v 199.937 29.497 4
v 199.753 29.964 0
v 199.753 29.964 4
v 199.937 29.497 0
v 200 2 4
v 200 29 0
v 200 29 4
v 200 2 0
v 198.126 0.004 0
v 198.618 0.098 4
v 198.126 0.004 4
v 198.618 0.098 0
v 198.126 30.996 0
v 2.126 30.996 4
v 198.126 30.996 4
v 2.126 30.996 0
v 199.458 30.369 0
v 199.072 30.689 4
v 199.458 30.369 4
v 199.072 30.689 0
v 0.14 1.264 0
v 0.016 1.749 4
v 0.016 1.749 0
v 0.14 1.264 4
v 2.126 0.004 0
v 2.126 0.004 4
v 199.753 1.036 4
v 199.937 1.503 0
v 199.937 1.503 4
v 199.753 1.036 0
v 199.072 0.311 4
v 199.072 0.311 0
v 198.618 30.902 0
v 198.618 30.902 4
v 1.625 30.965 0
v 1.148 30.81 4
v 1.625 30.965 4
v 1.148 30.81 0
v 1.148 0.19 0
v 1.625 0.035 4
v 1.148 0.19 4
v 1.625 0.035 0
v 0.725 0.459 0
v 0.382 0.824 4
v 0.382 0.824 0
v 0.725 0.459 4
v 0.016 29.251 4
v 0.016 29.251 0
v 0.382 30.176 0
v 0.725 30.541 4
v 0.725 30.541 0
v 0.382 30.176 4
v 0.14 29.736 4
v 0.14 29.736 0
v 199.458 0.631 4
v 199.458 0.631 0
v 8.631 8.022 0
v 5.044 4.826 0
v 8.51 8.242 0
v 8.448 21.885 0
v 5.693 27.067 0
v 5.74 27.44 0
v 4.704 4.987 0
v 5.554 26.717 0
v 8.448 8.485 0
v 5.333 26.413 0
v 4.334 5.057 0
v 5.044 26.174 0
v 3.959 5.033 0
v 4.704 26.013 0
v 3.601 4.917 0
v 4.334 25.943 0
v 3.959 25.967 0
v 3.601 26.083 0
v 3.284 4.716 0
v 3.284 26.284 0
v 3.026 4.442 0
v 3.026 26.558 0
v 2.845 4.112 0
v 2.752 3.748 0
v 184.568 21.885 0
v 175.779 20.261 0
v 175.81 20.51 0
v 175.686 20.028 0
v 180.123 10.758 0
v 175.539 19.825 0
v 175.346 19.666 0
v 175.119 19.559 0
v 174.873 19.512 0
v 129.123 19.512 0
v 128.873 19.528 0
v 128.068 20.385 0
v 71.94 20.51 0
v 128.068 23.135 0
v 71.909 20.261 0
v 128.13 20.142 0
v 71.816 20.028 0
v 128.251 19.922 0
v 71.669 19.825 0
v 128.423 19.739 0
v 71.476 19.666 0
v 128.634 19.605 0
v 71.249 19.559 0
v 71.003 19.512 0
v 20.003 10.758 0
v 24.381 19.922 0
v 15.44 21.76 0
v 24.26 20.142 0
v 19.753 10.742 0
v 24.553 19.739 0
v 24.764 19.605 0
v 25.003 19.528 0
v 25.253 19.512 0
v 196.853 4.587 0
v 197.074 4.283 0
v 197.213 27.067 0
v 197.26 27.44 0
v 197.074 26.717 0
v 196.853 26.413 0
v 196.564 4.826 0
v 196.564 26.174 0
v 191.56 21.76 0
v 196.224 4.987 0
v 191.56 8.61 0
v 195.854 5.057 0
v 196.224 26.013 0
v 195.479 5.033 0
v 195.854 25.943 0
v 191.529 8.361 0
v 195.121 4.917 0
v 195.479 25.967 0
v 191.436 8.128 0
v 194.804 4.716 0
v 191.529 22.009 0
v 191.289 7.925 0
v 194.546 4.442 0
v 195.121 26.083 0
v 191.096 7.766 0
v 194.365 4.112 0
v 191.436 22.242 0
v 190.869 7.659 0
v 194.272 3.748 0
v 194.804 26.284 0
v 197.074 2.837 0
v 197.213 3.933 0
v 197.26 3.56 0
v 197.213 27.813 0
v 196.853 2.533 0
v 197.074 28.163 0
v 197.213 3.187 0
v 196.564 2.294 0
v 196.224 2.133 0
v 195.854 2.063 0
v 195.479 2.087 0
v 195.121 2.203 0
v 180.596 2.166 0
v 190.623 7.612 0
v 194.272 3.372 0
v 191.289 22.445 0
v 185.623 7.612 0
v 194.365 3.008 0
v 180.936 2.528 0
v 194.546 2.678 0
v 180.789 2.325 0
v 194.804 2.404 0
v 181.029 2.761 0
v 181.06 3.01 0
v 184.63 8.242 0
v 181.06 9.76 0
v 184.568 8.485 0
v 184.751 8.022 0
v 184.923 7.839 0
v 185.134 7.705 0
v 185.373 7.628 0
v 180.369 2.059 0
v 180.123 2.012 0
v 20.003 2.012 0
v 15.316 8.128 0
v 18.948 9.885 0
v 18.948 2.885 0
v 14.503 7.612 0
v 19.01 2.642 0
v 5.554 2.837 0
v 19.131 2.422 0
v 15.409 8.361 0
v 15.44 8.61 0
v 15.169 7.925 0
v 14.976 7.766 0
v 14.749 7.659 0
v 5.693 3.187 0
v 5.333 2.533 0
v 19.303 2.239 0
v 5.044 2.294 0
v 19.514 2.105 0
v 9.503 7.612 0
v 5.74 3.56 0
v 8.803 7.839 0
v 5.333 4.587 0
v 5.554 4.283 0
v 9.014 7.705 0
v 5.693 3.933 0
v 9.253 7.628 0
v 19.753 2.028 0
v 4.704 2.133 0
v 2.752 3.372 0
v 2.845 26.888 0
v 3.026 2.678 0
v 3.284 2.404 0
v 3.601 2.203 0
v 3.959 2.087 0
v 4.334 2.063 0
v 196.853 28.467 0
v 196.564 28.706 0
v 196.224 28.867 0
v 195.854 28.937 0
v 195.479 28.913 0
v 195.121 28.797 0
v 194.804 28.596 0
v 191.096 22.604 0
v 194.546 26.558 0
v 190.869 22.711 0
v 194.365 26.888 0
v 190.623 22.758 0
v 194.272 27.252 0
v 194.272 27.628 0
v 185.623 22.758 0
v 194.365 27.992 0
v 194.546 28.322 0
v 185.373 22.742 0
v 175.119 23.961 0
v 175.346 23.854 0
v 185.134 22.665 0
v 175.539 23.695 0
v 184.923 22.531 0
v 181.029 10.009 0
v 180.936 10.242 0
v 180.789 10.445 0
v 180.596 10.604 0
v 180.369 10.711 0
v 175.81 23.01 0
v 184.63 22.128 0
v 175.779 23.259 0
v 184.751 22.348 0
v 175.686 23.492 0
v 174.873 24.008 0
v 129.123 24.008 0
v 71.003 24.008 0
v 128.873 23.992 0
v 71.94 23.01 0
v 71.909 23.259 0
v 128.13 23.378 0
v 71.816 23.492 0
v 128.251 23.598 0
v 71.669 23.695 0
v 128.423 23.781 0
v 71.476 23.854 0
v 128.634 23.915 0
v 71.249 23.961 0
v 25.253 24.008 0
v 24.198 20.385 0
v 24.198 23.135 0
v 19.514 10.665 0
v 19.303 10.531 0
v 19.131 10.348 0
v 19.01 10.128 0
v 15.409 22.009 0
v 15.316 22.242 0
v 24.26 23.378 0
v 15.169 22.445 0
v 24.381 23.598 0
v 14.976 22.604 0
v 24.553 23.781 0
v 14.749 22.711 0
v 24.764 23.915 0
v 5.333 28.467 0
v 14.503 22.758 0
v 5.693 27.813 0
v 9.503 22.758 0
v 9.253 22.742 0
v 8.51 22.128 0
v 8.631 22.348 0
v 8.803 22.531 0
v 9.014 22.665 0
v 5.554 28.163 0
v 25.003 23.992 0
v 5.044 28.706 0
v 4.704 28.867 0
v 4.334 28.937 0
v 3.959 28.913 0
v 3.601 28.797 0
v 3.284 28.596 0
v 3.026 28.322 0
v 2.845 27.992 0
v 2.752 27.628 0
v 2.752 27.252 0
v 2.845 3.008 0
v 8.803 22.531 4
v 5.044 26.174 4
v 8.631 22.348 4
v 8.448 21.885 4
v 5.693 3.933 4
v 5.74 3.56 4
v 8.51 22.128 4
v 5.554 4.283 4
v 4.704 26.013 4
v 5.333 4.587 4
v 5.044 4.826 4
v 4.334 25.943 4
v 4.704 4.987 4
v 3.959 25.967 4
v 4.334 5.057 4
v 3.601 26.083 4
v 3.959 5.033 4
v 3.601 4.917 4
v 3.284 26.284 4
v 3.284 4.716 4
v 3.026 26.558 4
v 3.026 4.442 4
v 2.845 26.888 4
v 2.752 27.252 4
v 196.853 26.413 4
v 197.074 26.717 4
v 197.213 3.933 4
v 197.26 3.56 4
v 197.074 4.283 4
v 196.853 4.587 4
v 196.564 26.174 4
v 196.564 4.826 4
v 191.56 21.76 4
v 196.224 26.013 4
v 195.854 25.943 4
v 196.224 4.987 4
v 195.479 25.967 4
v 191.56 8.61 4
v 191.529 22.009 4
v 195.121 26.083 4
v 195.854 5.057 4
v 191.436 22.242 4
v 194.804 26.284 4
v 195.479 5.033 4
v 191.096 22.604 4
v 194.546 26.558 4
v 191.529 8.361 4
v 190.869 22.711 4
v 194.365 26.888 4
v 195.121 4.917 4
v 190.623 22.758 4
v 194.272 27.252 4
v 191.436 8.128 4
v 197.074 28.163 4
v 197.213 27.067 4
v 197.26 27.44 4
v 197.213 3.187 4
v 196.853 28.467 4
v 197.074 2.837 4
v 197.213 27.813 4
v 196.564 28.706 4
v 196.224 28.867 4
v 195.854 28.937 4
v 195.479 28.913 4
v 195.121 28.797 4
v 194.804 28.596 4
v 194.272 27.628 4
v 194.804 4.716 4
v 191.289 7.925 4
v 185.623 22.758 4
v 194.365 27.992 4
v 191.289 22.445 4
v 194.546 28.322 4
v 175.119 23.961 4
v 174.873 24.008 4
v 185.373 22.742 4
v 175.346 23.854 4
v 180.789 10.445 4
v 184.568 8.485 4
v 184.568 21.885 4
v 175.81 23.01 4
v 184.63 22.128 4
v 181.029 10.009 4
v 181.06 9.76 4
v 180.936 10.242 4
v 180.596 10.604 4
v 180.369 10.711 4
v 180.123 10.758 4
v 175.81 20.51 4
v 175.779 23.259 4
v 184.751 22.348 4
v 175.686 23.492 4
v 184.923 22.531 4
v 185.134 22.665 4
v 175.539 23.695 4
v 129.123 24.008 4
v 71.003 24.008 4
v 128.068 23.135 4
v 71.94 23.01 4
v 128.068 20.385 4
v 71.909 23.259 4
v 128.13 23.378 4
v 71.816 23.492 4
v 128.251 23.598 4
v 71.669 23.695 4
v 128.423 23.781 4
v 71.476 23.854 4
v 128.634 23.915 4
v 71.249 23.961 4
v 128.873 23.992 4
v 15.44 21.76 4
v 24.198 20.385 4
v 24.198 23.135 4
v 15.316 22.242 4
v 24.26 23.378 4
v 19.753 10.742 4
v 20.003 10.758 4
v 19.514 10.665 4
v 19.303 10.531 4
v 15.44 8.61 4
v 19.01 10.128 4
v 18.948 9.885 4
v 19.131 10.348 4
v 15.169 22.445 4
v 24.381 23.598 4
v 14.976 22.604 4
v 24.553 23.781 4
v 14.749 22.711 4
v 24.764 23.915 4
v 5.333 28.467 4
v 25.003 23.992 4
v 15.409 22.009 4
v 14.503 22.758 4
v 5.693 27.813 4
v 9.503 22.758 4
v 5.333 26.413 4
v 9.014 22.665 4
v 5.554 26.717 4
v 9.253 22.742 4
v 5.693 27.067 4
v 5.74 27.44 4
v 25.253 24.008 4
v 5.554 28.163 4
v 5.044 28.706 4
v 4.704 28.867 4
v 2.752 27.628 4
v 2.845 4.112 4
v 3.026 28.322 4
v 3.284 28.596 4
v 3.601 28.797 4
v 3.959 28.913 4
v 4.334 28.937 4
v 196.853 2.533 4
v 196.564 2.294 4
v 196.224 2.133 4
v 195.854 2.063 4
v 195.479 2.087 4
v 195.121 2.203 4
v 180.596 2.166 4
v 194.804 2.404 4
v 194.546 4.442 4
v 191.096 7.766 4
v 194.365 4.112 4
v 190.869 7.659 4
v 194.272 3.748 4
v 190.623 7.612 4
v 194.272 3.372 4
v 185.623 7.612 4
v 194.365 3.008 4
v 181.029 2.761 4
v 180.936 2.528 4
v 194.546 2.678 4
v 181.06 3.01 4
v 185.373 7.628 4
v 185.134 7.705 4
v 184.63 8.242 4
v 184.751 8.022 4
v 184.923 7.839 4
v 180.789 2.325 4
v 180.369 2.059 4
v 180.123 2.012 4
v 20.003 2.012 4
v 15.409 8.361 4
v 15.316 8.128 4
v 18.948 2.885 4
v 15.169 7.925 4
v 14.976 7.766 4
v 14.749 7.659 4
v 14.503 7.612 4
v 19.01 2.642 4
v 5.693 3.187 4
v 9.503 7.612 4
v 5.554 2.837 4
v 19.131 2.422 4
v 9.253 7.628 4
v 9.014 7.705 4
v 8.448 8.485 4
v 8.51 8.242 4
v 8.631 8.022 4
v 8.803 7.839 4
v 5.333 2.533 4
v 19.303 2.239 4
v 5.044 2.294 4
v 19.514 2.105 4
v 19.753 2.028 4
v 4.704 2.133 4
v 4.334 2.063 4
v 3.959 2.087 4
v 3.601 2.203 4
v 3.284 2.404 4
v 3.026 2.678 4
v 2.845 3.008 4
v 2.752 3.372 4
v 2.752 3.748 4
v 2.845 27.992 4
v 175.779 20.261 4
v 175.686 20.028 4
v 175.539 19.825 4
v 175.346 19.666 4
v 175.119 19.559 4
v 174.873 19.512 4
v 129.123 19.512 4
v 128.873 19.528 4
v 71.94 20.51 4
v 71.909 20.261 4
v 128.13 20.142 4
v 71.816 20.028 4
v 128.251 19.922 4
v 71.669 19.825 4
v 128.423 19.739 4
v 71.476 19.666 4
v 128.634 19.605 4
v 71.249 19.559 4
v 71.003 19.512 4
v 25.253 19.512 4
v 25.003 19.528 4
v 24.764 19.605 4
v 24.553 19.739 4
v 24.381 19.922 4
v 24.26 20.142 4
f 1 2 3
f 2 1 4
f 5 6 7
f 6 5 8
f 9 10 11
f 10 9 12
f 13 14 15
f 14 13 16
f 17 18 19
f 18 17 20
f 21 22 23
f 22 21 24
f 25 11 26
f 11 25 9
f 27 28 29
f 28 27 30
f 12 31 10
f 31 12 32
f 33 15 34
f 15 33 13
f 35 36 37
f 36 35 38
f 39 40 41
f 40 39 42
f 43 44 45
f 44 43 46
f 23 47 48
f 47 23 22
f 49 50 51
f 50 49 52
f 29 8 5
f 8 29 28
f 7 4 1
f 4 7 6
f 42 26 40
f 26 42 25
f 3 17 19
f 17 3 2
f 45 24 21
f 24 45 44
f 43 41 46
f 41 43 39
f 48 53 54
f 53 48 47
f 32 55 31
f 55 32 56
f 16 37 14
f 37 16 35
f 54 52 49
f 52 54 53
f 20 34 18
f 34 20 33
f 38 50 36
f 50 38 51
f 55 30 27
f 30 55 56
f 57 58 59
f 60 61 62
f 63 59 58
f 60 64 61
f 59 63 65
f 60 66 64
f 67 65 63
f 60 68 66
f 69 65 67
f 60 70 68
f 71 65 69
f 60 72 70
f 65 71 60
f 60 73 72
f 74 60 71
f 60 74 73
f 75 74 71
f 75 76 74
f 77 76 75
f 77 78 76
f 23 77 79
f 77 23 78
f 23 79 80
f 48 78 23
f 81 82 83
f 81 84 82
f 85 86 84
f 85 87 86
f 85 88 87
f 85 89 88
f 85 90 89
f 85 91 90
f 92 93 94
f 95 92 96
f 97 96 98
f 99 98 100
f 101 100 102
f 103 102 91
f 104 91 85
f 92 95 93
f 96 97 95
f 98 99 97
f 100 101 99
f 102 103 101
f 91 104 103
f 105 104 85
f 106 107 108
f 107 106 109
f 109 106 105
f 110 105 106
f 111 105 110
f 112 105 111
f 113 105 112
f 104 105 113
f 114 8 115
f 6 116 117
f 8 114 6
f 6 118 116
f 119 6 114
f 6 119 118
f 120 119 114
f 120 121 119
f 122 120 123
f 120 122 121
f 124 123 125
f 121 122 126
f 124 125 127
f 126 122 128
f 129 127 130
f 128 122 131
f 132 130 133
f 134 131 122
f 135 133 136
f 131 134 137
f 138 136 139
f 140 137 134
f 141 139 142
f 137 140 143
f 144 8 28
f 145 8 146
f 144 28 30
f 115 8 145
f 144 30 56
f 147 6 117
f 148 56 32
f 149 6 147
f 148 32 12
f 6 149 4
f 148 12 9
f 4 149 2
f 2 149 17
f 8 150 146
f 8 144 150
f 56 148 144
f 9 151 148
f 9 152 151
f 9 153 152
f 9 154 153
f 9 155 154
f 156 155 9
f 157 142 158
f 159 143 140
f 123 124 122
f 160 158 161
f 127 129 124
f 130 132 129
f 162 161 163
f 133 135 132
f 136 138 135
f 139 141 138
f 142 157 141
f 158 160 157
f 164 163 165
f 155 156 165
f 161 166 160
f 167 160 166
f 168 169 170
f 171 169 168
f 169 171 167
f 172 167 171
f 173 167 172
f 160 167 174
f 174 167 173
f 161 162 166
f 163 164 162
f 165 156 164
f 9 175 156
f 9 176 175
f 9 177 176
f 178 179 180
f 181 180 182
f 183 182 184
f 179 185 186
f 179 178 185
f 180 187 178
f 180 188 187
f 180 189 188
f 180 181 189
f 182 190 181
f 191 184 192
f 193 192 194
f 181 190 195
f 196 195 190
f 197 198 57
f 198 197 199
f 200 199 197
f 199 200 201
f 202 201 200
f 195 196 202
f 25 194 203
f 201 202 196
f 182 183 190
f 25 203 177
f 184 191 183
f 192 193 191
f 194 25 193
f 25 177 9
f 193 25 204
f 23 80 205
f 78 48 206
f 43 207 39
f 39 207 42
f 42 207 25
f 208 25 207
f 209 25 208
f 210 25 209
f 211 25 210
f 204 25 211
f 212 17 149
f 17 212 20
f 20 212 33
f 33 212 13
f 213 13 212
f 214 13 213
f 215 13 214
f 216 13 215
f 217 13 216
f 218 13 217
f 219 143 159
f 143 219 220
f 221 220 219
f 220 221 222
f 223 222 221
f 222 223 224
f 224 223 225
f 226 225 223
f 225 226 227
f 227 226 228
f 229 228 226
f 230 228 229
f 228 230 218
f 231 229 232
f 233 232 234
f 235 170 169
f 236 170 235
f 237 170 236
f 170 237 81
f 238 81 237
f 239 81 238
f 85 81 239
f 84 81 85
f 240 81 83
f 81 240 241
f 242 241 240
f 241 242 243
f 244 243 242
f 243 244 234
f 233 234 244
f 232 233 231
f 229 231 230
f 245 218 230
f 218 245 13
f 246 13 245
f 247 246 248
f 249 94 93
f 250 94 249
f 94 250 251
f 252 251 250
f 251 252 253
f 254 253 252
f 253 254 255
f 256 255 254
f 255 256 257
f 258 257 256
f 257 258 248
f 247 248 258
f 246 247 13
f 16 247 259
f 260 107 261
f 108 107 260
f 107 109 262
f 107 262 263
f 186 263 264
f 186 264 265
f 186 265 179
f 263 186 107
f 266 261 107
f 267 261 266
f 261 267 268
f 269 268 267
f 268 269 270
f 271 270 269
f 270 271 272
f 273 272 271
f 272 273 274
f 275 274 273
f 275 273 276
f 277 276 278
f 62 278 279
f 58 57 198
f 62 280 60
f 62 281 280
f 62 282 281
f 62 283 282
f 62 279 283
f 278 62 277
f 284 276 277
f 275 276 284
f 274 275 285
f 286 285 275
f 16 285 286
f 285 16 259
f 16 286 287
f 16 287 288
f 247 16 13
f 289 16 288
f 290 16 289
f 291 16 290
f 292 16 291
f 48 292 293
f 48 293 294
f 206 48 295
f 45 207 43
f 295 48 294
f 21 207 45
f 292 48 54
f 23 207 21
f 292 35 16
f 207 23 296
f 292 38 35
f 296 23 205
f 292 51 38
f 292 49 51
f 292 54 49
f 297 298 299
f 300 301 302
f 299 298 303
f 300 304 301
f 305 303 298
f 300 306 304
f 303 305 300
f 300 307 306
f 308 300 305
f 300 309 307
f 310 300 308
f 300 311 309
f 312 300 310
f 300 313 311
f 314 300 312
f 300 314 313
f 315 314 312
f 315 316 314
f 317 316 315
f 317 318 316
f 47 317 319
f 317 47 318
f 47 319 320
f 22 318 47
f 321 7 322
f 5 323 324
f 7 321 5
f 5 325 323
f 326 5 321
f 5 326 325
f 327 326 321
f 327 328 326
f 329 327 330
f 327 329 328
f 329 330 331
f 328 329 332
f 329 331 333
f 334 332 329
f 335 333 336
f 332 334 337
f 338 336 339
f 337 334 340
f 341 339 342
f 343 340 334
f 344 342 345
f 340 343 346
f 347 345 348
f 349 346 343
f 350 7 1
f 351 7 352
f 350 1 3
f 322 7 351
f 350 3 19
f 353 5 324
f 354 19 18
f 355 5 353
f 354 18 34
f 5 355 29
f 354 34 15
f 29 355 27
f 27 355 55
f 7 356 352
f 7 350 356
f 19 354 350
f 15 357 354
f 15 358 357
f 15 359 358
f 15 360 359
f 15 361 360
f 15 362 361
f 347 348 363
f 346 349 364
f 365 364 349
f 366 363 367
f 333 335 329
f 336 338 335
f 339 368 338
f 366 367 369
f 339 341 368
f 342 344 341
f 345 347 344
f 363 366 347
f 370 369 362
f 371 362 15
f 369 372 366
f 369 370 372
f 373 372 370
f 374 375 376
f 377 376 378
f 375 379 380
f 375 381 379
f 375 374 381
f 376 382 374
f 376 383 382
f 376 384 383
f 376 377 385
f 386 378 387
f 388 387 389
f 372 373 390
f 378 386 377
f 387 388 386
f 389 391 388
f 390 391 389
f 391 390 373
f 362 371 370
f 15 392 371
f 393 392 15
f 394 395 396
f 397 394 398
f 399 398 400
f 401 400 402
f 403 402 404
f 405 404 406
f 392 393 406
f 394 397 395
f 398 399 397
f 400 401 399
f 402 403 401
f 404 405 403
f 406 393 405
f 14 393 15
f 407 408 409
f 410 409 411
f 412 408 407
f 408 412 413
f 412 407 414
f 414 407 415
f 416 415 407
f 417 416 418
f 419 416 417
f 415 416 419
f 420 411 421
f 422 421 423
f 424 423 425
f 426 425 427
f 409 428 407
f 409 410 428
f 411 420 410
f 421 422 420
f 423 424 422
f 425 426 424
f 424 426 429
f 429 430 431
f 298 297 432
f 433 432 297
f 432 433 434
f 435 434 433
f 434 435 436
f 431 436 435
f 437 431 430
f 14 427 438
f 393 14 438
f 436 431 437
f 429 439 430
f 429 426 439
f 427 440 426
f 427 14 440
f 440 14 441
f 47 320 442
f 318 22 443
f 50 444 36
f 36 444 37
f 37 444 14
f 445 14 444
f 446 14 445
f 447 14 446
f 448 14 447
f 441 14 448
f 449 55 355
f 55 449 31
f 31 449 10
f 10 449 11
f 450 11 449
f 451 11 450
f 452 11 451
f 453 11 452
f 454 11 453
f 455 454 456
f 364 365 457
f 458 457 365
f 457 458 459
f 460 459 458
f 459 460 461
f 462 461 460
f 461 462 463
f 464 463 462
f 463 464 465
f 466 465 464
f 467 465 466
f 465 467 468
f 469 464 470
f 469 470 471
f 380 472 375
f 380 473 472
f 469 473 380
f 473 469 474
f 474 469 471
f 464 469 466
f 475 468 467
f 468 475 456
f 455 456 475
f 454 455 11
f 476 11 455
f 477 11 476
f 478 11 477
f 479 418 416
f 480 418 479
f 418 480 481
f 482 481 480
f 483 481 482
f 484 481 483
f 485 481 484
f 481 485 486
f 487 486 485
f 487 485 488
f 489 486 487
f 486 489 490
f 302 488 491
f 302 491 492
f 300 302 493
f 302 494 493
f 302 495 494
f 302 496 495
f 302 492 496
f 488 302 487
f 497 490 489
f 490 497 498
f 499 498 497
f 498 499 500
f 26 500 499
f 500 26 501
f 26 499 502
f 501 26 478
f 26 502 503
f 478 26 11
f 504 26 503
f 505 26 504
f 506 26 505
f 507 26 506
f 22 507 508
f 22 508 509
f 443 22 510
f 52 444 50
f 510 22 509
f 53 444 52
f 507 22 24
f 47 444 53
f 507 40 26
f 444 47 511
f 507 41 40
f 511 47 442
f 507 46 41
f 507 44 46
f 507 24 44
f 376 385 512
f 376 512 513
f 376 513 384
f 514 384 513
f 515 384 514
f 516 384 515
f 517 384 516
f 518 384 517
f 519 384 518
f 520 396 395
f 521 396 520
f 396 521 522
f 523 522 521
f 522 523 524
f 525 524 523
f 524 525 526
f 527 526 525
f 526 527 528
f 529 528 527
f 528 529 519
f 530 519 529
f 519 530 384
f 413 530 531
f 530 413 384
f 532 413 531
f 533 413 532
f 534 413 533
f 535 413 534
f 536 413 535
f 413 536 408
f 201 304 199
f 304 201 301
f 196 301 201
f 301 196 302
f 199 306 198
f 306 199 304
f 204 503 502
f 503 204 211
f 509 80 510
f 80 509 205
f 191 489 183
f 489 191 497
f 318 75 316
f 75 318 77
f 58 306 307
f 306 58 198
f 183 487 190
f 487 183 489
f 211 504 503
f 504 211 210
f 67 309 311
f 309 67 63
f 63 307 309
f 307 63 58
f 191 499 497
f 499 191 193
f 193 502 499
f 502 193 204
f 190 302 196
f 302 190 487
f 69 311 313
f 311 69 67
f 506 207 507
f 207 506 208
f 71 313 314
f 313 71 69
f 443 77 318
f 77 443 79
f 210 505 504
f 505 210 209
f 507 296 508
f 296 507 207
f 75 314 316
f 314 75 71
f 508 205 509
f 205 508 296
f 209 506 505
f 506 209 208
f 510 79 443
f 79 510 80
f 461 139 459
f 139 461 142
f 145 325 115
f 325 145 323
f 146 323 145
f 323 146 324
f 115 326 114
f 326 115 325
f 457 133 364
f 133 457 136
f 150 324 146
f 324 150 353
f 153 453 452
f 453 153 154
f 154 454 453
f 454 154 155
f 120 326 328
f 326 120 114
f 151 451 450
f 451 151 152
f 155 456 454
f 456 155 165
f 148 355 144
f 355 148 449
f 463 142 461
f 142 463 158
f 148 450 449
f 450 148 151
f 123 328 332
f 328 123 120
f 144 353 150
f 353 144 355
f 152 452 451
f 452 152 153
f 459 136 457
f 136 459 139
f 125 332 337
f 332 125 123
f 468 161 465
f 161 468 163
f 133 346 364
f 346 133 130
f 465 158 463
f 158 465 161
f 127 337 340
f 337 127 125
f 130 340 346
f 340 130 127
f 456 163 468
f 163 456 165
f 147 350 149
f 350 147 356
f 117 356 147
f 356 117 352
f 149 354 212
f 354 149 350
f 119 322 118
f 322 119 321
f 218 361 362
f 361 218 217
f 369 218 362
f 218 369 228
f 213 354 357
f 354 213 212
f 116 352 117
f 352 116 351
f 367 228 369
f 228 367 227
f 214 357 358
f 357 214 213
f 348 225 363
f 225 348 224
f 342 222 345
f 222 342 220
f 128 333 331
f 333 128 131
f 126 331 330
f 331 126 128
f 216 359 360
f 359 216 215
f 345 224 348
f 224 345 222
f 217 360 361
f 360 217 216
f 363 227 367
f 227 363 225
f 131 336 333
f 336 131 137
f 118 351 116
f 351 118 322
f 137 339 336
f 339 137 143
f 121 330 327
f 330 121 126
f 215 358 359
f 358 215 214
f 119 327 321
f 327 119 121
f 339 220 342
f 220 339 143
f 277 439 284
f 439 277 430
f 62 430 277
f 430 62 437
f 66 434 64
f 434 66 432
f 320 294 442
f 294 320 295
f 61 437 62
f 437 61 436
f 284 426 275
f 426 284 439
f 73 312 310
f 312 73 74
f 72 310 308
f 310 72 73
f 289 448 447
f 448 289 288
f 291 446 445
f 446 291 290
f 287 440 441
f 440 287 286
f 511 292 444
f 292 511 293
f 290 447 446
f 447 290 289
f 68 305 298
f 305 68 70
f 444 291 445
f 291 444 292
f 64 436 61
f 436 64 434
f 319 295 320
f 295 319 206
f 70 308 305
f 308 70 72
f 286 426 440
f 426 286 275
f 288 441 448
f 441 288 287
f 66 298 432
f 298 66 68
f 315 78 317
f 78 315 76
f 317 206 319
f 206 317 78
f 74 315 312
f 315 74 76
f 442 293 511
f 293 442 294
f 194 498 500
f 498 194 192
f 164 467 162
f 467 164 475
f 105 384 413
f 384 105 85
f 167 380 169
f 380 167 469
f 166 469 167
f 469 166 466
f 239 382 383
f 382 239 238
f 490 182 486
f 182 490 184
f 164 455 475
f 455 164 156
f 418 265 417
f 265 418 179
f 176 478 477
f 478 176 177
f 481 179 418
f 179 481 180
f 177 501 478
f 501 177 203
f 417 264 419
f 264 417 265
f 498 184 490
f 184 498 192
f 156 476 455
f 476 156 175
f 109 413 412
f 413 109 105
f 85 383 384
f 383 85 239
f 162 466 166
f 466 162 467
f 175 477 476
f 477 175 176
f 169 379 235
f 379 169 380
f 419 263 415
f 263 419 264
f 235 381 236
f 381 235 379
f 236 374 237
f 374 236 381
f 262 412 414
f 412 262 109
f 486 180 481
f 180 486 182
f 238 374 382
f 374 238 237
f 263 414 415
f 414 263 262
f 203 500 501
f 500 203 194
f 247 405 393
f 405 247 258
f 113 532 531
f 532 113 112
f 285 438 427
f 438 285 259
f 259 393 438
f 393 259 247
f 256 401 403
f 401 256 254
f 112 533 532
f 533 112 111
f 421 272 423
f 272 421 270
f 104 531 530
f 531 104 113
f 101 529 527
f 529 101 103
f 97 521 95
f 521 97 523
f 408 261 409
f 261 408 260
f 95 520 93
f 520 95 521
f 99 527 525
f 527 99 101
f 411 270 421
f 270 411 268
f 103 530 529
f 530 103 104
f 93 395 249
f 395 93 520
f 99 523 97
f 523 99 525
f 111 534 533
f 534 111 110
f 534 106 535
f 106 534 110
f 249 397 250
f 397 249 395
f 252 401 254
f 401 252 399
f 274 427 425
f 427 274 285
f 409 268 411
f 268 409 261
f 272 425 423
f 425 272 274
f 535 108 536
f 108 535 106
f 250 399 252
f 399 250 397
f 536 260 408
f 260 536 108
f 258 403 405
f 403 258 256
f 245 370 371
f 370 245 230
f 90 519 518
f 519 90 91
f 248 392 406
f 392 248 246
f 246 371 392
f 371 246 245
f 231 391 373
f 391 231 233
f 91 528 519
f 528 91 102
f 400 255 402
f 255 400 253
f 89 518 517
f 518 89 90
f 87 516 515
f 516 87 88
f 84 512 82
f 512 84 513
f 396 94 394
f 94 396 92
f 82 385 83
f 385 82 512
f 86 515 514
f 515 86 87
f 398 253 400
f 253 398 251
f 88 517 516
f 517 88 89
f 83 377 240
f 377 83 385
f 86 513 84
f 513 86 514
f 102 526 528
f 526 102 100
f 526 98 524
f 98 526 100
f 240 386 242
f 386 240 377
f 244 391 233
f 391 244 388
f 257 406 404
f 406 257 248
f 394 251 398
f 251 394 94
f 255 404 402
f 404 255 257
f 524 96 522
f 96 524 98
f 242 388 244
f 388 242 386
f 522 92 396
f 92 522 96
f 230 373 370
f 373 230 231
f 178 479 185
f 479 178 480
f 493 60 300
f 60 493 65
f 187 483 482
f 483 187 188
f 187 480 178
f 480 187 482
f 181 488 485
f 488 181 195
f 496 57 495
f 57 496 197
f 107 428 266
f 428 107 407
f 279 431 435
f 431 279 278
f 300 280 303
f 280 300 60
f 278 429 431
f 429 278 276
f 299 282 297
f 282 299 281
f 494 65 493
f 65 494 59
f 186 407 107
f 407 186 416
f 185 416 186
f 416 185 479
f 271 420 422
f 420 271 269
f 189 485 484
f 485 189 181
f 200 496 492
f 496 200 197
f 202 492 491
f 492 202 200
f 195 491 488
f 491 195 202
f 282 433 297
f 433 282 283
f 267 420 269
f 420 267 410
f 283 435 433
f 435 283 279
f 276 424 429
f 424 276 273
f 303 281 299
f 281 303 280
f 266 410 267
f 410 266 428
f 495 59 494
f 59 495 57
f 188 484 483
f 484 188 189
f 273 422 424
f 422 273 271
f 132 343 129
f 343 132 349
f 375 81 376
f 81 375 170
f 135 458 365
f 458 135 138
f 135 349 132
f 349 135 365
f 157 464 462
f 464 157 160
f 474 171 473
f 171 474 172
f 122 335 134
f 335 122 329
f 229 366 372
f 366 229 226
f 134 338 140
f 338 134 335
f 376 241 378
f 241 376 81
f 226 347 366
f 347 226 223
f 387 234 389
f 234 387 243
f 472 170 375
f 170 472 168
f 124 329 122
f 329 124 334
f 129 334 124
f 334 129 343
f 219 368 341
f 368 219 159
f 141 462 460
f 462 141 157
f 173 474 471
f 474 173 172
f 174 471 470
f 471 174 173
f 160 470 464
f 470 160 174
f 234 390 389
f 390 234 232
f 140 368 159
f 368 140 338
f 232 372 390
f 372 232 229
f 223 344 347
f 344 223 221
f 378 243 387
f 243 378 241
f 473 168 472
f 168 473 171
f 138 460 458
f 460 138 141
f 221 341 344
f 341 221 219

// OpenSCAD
$fn=25;

bracket_height = 4;

length = 200;
width = 31;
actual_length = 198.12;
actual_width = 30.48;
length_buffer = length - actual_length;
width_buffer = width - actual_width;
length_buffer_per_side = length_buffer / 2;
width_buffer_per_side = width_buffer / 2;

mount_hole_radius = 1.5;
mount_hole_center_to_edge = 3.3;

motor_cutout_start_y = 1.75;
motor_cutout_end_y = 10.5;
motor_cutout_start_x = 18;

sensor_cutout_start_y = 19.25;
sensor_cutout_end_y =  23.75;
sensor_cutout_start_x = 23.25;
sensor_mid_gap_start = 71;

ribbon_cutout_start_y = 7.35;
ribbon_cutout_end_y = 22.5;
ribbon_cutout_start_x = 7.5;
ribbon_cutout_len = 7;


difference(){
    roundedcube([length, width, bracket_height], false, 2, "z");
    
    // punch out mounting holes
    translate([
        length_buffer_per_side + mount_hole_center_to_edge, 
        width_buffer_per_side + mount_hole_center_to_edge, 
        0])
    cylinder(h=bracket_height, r=mount_hole_radius);
    
    translate([
        length - (length_buffer_per_side + mount_hole_center_to_edge), 
        width_buffer_per_side + mount_hole_center_to_edge, 
        0])
    cylinder(h=bracket_height, r=mount_hole_radius);
    
    translate([
        length - (length_buffer_per_side + mount_hole_center_to_edge), 
        width - (width_buffer_per_side + mount_hole_center_to_edge), 
        0])
    cylinder(h=bracket_height, r=mount_hole_radius);
    
    translate([
        length_buffer_per_side + mount_hole_center_to_edge,
        width - (width_buffer_per_side + mount_hole_center_to_edge),
        0])
    cylinder(h=bracket_height, r=mount_hole_radius);
    
    // puch out through-hole solder areas
    
    // motor and power
    motor_cutout_len = actual_length - (motor_cutout_start_x*2);
    motor_cutout_width = motor_cutout_end_y - motor_cutout_start_y;
    translate([
        length_buffer_per_side + motor_cutout_start_x,
        width_buffer_per_side + motor_cutout_start_y,
        0])
    roundedcube([motor_cutout_len, motor_cutout_width, bracket_height], false, 1, "z");
    
    // sensor A
    sensor_cutout_len = sensor_mid_gap_start - sensor_cutout_start_x;
    sensor_cutout_width = sensor_cutout_end_y - sensor_cutout_start_y;
    translate([
        length_buffer_per_side + sensor_cutout_start_x,
        width_buffer_per_side + sensor_cutout_start_y,
        0])
    roundedcube([sensor_cutout_len, sensor_cutout_width, bracket_height], false, 1, "z");
    
    // sensor B
    translate([
        length - (length_buffer_per_side + sensor_cutout_start_x + sensor_cutout_len),
        width_buffer_per_side + sensor_cutout_start_y,
        0])
    roundedcube([sensor_cutout_len, sensor_cutout_width, bracket_height], false, 1, "z");
    
    // ribbon A
    ribbon_cutout_width = ribbon_cutout_end_y - ribbon_cutout_start_y;
    translate([
        length_buffer_per_side + ribbon_cutout_start_x,
        width_buffer_per_side + ribbon_cutout_start_y,
        0])
    roundedcube([ribbon_cutout_len, ribbon_cutout_width, bracket_height], false, 1, "z");
    
    // ribbon B
    translate([
        length - (length_buffer_per_side + ribbon_cutout_start_x + ribbon_cutout_len),
        width_buffer_per_side + ribbon_cutout_start_y,
        0])
    roundedcube([ribbon_cutout_len, ribbon_cutout_width, bracket_height], false, 1, "z");
}

// Higher definition curves
// FROM: https://danielupshaw.com/openscad-rounded-corners/
$fs = 0.01;

module roundedcube(size = [1, 1, 1], center = false, radius = 0.5, apply_to = "all") {
	// If single value, convert to [x, y, z] vector
	size = (size[0] == undef) ? [size, size, size] : size;

	translate_min = radius;
	translate_xmax = size[0] - radius;
	translate_ymax = size[1] - radius;
	translate_zmax = size[2] - radius;

	diameter = radius * 2;

	module build_point(type = "sphere", rotate = [0, 0, 0]) {
		if (type == "sphere") {
			sphere(r = radius);
		} else if (type == "cylinder") {
			rotate(a = rotate)
			cylinder(h = diameter, r = radius, center = true);
		}
	}

	obj_translate = (center == false) ?
		[0, 0, 0] : [
			-(size[0] / 2),
			-(size[1] / 2),
			-(size[2] / 2)
		];

	translate(v = obj_translate) {
		hull() {
			for (translate_x = [translate_min, translate_xmax]) {
				x_at = (translate_x == translate_min) ? "min" : "max";
				for (translate_y = [translate_min, translate_ymax]) {
					y_at = (translate_y == translate_min) ? "min" : "max";
					for (translate_z = [translate_min, translate_zmax]) {
						z_at = (translate_z == translate_min) ? "min" : "max";

						translate(v = [translate_x, translate_y, translate_z])
						if (
							(apply_to == "all") ||
							(apply_to == "xmin" && x_at == "min") || (apply_to == "xmax" && x_at == "max") ||
							(apply_to == "ymin" && y_at == "min") || (apply_to == "ymax" && y_at == "max") ||
							(apply_to == "zmin" && z_at == "min") || (apply_to == "zmax" && z_at == "max")
						) {
							build_point("sphere");
						} else {
							rotate = 
								(apply_to == "xmin" || apply_to == "xmax" || apply_to == "x") ? [0, 90, 0] : (
								(apply_to == "ymin" || apply_to == "ymax" || apply_to == "y") ? [90, 90, 0] :
								[0, 0, 0]
							);
							build_point("cylinder", rotate);
						}
					}
				}
			}
		}
	}
}
